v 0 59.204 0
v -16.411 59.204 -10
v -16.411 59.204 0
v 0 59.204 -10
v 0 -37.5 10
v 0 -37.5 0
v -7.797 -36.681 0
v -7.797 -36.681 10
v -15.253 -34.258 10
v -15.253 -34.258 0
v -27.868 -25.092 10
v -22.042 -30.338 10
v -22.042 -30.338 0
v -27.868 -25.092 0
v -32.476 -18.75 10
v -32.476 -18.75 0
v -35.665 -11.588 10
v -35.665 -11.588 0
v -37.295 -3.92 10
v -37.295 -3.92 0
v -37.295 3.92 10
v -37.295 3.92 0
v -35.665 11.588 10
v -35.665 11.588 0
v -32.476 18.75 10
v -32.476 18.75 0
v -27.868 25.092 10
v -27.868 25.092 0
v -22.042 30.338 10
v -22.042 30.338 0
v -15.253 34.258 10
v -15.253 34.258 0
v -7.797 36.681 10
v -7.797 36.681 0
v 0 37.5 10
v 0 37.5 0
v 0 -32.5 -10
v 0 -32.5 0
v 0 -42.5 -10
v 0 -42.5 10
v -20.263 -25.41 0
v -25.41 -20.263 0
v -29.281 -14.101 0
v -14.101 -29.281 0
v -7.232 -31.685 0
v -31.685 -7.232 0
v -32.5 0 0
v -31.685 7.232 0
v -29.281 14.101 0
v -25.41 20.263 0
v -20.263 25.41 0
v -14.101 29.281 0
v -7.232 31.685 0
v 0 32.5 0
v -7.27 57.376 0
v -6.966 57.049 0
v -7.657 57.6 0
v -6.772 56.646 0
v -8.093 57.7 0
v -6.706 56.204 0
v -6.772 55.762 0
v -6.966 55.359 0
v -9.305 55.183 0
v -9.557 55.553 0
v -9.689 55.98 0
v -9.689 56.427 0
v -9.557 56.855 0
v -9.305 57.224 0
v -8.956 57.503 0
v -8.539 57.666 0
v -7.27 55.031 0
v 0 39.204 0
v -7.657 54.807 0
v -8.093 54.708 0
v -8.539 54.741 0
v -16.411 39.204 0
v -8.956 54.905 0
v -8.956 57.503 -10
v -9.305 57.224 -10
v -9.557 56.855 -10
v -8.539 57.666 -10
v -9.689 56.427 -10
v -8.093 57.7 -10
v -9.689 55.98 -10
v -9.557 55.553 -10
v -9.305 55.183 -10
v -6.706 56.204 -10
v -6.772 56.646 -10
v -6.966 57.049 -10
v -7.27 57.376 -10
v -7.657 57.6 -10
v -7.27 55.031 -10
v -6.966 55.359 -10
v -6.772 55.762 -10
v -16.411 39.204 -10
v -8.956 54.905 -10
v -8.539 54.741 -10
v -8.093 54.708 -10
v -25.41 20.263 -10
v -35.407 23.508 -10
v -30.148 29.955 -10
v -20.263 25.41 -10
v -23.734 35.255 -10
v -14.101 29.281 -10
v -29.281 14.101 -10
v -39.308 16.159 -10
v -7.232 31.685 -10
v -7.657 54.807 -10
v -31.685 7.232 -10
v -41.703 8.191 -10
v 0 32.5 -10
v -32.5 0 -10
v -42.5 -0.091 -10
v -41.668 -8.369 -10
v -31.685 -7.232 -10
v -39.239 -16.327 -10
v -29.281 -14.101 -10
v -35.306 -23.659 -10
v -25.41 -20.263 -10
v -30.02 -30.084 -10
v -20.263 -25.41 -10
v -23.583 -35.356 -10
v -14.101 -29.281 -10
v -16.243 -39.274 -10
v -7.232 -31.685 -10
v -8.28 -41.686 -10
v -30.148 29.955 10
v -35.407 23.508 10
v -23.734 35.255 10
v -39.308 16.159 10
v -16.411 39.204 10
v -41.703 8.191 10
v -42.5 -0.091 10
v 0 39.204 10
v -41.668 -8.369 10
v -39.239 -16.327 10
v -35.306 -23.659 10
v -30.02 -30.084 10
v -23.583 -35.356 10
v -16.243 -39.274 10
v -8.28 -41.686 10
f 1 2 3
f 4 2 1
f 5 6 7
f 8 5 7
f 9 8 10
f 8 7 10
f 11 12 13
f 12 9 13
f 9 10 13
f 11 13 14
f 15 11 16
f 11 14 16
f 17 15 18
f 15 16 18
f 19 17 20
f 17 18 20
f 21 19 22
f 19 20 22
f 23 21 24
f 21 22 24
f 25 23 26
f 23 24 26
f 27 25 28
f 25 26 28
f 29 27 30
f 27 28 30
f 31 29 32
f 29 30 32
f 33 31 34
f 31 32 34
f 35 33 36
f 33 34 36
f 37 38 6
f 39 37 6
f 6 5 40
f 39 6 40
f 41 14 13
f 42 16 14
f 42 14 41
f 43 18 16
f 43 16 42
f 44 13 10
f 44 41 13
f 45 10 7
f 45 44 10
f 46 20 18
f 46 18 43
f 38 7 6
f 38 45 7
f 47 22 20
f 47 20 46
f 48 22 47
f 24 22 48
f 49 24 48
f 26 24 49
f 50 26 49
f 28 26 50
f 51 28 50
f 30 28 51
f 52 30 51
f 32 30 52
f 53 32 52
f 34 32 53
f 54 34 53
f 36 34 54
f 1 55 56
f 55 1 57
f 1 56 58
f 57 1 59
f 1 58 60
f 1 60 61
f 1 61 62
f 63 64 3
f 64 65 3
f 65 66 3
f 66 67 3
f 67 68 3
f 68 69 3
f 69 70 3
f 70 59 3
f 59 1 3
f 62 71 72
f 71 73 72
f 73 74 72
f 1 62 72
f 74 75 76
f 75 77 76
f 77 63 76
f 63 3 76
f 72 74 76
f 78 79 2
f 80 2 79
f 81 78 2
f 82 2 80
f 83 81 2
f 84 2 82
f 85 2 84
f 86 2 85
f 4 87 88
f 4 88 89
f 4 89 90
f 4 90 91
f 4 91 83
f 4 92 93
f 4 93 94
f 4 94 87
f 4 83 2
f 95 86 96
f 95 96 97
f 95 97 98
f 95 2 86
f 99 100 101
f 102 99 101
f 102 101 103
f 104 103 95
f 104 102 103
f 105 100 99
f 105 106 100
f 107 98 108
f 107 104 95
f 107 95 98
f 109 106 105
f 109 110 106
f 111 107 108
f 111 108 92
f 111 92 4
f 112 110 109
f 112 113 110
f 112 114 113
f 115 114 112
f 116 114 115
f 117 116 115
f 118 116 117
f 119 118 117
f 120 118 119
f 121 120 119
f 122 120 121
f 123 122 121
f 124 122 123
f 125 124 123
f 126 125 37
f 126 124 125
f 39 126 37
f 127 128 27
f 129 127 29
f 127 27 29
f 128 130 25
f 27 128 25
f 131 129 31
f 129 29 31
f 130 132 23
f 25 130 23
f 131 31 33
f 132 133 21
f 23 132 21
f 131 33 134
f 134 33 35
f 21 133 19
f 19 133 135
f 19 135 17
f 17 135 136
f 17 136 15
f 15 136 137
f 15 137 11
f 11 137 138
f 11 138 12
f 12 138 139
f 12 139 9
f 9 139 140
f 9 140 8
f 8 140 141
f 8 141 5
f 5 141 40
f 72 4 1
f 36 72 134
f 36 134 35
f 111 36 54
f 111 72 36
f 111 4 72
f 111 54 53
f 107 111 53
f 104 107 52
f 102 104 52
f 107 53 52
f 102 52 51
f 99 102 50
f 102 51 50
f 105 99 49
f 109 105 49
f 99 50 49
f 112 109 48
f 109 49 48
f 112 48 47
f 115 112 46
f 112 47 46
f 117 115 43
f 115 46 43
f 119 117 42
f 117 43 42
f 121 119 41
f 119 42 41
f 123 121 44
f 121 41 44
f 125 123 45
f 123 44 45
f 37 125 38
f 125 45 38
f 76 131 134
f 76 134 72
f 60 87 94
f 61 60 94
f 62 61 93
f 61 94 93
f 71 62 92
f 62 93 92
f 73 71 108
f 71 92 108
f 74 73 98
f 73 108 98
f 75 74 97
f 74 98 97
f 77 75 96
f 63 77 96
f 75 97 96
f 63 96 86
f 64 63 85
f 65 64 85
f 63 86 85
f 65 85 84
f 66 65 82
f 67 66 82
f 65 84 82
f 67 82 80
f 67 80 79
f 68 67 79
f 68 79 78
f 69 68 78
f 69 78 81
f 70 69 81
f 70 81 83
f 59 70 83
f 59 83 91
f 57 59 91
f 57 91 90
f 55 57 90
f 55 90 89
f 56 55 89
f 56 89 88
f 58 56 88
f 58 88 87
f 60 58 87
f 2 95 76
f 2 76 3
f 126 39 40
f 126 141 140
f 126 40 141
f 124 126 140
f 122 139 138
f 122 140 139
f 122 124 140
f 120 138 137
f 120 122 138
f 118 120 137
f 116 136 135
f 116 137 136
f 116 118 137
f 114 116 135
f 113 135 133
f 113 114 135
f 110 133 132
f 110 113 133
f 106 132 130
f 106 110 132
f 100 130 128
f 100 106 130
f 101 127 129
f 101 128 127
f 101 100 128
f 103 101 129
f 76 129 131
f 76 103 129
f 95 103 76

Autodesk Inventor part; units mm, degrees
ref_plane "YZ Plane" through (0, 0, 0) normal (1, 0, 0) x (0, 1, 0)
ref_plane "XZ Plane" through (0, 0, 0) normal (0, 1, 0) x (-1, 0, 0)
ref_plane "XY Plane" through (0, 0, 0) normal (0, 0, 1) x (1, 0, 0)
sketch "草圖1" plane through (0, 0, 0) normal (0, 0, 1) x (1, 0, 0)
  arc A0 (0, 32.5) -> (0, -32.5) centre (0, 0) ccw
  arc A1 (0, 37.5) -> (0, -37.5) centre (0, 0) ccw
  arc A2 (0, 42.5) -> (0, -42.5) centre (0, 0) ccw
  line L0 (0, 0) -> (0, -59.8463)
  line L1 (0, -59.8463) -> (0, 72.1748)
  point P0 (0, -37.5)
  point P1 (0, -42.5)
  dimension "d22" = 32.5
  dimension "d23" = 37.5
  dimension "d24" = 42.5
extrude "擠出1" add sketch "草圖1" against normal blind 10 contours A0 L0 A1 L1
extrude "擠出2" add sketch "草圖1" along normal mid plane 20 contours A1 L0 A2 L1
sketch "草圖2" plane through (0, 0, -10) normal (0, 0, -1) x (1, 0, 0)
  line L0 (0, -42.5) -> (0, -32.5) projected
  line L1 (0, -42.5) -> (0, -32.5)
  arc A0 (0, 42.5) -> (0, -42.5) centre (0, 0) ccw projected
  line L2 (-16.4109, -59.2037) -> (0, -59.2037)
  line L3 (0, -59.2037) -> (0, -42.5)
  line L4 (-16.4109, -39.2037) -> (-16.4109, -59.2037)
  dimension "d4" = 10
  dimension "d16" = 20
extrude "擠出3" add sketch "草圖2" against normal blind 20
sketch "草圖4" plane through (0, 0, -10) normal (0, 0, -1) x (1, 0, 0)
  line L0 (3, 24.6083) -> (3, 21.6083)
  line L1 (0, -59.2037) -> (0, -32.5) projected
  line L2 (0, 21.6083) -> (3, 21.6083)
  circle A0 centre (3, 21.6083) radius 1.5
  line L3 (0, -59.2037) -> (-16.4109, -59.2037) projected
  line L4 (-16.4109, -59.2037) -> (-8.2055, -59.2037)
  line L5 (-8.2055, -56.2037) -> (-8.2055, -59.2037)
  line L6 (-16.4109, -59.2037) -> (-16.4109, -39.2037) projected
  circle A1 centre (-8.2055, -56.2037) radius 1.5
  point P0 (0, 0)
  point P1 (0, 24.3333)
  point P2 (0, 13.1972)
  point P3 (0, -15.5384)
  dimension "d10" = 3
  dimension "d11" = 3
  dimension "d12" = 3
  dimension "d17" = 3
  dimension "d18" = 3
extrude "擠出4" cut sketch "草圖4" against normal blind 20 contours A1
sketch "草圖6" plane through (-16.4109, 39.2037, -10) normal (-1, 0, 0) x (0, 0, 1)
  line L0 (0, 20) -> (20, 20) projected
  line L1 (20, 20) -> (10, 20)
  line L2 (10, 20) -> (10, 0)
  line L3 (20, 0) -> (0, 0) projected
  line L4 (20, 20) -> (20, 0) projected
  line L5 (10, 20) -> (20, 20)
  line L6 (20, 20) -> (20, 0)
  line L7 (20, 0) -> (10, 0)
  line L8 (10, 0) -> (10, 20)
  point P0 (10, -39.2037)
  dimension "d19" = 10
extrude "擠出5" cut sketch "草圖6" against normal blind 20
properties part number "ARML"
